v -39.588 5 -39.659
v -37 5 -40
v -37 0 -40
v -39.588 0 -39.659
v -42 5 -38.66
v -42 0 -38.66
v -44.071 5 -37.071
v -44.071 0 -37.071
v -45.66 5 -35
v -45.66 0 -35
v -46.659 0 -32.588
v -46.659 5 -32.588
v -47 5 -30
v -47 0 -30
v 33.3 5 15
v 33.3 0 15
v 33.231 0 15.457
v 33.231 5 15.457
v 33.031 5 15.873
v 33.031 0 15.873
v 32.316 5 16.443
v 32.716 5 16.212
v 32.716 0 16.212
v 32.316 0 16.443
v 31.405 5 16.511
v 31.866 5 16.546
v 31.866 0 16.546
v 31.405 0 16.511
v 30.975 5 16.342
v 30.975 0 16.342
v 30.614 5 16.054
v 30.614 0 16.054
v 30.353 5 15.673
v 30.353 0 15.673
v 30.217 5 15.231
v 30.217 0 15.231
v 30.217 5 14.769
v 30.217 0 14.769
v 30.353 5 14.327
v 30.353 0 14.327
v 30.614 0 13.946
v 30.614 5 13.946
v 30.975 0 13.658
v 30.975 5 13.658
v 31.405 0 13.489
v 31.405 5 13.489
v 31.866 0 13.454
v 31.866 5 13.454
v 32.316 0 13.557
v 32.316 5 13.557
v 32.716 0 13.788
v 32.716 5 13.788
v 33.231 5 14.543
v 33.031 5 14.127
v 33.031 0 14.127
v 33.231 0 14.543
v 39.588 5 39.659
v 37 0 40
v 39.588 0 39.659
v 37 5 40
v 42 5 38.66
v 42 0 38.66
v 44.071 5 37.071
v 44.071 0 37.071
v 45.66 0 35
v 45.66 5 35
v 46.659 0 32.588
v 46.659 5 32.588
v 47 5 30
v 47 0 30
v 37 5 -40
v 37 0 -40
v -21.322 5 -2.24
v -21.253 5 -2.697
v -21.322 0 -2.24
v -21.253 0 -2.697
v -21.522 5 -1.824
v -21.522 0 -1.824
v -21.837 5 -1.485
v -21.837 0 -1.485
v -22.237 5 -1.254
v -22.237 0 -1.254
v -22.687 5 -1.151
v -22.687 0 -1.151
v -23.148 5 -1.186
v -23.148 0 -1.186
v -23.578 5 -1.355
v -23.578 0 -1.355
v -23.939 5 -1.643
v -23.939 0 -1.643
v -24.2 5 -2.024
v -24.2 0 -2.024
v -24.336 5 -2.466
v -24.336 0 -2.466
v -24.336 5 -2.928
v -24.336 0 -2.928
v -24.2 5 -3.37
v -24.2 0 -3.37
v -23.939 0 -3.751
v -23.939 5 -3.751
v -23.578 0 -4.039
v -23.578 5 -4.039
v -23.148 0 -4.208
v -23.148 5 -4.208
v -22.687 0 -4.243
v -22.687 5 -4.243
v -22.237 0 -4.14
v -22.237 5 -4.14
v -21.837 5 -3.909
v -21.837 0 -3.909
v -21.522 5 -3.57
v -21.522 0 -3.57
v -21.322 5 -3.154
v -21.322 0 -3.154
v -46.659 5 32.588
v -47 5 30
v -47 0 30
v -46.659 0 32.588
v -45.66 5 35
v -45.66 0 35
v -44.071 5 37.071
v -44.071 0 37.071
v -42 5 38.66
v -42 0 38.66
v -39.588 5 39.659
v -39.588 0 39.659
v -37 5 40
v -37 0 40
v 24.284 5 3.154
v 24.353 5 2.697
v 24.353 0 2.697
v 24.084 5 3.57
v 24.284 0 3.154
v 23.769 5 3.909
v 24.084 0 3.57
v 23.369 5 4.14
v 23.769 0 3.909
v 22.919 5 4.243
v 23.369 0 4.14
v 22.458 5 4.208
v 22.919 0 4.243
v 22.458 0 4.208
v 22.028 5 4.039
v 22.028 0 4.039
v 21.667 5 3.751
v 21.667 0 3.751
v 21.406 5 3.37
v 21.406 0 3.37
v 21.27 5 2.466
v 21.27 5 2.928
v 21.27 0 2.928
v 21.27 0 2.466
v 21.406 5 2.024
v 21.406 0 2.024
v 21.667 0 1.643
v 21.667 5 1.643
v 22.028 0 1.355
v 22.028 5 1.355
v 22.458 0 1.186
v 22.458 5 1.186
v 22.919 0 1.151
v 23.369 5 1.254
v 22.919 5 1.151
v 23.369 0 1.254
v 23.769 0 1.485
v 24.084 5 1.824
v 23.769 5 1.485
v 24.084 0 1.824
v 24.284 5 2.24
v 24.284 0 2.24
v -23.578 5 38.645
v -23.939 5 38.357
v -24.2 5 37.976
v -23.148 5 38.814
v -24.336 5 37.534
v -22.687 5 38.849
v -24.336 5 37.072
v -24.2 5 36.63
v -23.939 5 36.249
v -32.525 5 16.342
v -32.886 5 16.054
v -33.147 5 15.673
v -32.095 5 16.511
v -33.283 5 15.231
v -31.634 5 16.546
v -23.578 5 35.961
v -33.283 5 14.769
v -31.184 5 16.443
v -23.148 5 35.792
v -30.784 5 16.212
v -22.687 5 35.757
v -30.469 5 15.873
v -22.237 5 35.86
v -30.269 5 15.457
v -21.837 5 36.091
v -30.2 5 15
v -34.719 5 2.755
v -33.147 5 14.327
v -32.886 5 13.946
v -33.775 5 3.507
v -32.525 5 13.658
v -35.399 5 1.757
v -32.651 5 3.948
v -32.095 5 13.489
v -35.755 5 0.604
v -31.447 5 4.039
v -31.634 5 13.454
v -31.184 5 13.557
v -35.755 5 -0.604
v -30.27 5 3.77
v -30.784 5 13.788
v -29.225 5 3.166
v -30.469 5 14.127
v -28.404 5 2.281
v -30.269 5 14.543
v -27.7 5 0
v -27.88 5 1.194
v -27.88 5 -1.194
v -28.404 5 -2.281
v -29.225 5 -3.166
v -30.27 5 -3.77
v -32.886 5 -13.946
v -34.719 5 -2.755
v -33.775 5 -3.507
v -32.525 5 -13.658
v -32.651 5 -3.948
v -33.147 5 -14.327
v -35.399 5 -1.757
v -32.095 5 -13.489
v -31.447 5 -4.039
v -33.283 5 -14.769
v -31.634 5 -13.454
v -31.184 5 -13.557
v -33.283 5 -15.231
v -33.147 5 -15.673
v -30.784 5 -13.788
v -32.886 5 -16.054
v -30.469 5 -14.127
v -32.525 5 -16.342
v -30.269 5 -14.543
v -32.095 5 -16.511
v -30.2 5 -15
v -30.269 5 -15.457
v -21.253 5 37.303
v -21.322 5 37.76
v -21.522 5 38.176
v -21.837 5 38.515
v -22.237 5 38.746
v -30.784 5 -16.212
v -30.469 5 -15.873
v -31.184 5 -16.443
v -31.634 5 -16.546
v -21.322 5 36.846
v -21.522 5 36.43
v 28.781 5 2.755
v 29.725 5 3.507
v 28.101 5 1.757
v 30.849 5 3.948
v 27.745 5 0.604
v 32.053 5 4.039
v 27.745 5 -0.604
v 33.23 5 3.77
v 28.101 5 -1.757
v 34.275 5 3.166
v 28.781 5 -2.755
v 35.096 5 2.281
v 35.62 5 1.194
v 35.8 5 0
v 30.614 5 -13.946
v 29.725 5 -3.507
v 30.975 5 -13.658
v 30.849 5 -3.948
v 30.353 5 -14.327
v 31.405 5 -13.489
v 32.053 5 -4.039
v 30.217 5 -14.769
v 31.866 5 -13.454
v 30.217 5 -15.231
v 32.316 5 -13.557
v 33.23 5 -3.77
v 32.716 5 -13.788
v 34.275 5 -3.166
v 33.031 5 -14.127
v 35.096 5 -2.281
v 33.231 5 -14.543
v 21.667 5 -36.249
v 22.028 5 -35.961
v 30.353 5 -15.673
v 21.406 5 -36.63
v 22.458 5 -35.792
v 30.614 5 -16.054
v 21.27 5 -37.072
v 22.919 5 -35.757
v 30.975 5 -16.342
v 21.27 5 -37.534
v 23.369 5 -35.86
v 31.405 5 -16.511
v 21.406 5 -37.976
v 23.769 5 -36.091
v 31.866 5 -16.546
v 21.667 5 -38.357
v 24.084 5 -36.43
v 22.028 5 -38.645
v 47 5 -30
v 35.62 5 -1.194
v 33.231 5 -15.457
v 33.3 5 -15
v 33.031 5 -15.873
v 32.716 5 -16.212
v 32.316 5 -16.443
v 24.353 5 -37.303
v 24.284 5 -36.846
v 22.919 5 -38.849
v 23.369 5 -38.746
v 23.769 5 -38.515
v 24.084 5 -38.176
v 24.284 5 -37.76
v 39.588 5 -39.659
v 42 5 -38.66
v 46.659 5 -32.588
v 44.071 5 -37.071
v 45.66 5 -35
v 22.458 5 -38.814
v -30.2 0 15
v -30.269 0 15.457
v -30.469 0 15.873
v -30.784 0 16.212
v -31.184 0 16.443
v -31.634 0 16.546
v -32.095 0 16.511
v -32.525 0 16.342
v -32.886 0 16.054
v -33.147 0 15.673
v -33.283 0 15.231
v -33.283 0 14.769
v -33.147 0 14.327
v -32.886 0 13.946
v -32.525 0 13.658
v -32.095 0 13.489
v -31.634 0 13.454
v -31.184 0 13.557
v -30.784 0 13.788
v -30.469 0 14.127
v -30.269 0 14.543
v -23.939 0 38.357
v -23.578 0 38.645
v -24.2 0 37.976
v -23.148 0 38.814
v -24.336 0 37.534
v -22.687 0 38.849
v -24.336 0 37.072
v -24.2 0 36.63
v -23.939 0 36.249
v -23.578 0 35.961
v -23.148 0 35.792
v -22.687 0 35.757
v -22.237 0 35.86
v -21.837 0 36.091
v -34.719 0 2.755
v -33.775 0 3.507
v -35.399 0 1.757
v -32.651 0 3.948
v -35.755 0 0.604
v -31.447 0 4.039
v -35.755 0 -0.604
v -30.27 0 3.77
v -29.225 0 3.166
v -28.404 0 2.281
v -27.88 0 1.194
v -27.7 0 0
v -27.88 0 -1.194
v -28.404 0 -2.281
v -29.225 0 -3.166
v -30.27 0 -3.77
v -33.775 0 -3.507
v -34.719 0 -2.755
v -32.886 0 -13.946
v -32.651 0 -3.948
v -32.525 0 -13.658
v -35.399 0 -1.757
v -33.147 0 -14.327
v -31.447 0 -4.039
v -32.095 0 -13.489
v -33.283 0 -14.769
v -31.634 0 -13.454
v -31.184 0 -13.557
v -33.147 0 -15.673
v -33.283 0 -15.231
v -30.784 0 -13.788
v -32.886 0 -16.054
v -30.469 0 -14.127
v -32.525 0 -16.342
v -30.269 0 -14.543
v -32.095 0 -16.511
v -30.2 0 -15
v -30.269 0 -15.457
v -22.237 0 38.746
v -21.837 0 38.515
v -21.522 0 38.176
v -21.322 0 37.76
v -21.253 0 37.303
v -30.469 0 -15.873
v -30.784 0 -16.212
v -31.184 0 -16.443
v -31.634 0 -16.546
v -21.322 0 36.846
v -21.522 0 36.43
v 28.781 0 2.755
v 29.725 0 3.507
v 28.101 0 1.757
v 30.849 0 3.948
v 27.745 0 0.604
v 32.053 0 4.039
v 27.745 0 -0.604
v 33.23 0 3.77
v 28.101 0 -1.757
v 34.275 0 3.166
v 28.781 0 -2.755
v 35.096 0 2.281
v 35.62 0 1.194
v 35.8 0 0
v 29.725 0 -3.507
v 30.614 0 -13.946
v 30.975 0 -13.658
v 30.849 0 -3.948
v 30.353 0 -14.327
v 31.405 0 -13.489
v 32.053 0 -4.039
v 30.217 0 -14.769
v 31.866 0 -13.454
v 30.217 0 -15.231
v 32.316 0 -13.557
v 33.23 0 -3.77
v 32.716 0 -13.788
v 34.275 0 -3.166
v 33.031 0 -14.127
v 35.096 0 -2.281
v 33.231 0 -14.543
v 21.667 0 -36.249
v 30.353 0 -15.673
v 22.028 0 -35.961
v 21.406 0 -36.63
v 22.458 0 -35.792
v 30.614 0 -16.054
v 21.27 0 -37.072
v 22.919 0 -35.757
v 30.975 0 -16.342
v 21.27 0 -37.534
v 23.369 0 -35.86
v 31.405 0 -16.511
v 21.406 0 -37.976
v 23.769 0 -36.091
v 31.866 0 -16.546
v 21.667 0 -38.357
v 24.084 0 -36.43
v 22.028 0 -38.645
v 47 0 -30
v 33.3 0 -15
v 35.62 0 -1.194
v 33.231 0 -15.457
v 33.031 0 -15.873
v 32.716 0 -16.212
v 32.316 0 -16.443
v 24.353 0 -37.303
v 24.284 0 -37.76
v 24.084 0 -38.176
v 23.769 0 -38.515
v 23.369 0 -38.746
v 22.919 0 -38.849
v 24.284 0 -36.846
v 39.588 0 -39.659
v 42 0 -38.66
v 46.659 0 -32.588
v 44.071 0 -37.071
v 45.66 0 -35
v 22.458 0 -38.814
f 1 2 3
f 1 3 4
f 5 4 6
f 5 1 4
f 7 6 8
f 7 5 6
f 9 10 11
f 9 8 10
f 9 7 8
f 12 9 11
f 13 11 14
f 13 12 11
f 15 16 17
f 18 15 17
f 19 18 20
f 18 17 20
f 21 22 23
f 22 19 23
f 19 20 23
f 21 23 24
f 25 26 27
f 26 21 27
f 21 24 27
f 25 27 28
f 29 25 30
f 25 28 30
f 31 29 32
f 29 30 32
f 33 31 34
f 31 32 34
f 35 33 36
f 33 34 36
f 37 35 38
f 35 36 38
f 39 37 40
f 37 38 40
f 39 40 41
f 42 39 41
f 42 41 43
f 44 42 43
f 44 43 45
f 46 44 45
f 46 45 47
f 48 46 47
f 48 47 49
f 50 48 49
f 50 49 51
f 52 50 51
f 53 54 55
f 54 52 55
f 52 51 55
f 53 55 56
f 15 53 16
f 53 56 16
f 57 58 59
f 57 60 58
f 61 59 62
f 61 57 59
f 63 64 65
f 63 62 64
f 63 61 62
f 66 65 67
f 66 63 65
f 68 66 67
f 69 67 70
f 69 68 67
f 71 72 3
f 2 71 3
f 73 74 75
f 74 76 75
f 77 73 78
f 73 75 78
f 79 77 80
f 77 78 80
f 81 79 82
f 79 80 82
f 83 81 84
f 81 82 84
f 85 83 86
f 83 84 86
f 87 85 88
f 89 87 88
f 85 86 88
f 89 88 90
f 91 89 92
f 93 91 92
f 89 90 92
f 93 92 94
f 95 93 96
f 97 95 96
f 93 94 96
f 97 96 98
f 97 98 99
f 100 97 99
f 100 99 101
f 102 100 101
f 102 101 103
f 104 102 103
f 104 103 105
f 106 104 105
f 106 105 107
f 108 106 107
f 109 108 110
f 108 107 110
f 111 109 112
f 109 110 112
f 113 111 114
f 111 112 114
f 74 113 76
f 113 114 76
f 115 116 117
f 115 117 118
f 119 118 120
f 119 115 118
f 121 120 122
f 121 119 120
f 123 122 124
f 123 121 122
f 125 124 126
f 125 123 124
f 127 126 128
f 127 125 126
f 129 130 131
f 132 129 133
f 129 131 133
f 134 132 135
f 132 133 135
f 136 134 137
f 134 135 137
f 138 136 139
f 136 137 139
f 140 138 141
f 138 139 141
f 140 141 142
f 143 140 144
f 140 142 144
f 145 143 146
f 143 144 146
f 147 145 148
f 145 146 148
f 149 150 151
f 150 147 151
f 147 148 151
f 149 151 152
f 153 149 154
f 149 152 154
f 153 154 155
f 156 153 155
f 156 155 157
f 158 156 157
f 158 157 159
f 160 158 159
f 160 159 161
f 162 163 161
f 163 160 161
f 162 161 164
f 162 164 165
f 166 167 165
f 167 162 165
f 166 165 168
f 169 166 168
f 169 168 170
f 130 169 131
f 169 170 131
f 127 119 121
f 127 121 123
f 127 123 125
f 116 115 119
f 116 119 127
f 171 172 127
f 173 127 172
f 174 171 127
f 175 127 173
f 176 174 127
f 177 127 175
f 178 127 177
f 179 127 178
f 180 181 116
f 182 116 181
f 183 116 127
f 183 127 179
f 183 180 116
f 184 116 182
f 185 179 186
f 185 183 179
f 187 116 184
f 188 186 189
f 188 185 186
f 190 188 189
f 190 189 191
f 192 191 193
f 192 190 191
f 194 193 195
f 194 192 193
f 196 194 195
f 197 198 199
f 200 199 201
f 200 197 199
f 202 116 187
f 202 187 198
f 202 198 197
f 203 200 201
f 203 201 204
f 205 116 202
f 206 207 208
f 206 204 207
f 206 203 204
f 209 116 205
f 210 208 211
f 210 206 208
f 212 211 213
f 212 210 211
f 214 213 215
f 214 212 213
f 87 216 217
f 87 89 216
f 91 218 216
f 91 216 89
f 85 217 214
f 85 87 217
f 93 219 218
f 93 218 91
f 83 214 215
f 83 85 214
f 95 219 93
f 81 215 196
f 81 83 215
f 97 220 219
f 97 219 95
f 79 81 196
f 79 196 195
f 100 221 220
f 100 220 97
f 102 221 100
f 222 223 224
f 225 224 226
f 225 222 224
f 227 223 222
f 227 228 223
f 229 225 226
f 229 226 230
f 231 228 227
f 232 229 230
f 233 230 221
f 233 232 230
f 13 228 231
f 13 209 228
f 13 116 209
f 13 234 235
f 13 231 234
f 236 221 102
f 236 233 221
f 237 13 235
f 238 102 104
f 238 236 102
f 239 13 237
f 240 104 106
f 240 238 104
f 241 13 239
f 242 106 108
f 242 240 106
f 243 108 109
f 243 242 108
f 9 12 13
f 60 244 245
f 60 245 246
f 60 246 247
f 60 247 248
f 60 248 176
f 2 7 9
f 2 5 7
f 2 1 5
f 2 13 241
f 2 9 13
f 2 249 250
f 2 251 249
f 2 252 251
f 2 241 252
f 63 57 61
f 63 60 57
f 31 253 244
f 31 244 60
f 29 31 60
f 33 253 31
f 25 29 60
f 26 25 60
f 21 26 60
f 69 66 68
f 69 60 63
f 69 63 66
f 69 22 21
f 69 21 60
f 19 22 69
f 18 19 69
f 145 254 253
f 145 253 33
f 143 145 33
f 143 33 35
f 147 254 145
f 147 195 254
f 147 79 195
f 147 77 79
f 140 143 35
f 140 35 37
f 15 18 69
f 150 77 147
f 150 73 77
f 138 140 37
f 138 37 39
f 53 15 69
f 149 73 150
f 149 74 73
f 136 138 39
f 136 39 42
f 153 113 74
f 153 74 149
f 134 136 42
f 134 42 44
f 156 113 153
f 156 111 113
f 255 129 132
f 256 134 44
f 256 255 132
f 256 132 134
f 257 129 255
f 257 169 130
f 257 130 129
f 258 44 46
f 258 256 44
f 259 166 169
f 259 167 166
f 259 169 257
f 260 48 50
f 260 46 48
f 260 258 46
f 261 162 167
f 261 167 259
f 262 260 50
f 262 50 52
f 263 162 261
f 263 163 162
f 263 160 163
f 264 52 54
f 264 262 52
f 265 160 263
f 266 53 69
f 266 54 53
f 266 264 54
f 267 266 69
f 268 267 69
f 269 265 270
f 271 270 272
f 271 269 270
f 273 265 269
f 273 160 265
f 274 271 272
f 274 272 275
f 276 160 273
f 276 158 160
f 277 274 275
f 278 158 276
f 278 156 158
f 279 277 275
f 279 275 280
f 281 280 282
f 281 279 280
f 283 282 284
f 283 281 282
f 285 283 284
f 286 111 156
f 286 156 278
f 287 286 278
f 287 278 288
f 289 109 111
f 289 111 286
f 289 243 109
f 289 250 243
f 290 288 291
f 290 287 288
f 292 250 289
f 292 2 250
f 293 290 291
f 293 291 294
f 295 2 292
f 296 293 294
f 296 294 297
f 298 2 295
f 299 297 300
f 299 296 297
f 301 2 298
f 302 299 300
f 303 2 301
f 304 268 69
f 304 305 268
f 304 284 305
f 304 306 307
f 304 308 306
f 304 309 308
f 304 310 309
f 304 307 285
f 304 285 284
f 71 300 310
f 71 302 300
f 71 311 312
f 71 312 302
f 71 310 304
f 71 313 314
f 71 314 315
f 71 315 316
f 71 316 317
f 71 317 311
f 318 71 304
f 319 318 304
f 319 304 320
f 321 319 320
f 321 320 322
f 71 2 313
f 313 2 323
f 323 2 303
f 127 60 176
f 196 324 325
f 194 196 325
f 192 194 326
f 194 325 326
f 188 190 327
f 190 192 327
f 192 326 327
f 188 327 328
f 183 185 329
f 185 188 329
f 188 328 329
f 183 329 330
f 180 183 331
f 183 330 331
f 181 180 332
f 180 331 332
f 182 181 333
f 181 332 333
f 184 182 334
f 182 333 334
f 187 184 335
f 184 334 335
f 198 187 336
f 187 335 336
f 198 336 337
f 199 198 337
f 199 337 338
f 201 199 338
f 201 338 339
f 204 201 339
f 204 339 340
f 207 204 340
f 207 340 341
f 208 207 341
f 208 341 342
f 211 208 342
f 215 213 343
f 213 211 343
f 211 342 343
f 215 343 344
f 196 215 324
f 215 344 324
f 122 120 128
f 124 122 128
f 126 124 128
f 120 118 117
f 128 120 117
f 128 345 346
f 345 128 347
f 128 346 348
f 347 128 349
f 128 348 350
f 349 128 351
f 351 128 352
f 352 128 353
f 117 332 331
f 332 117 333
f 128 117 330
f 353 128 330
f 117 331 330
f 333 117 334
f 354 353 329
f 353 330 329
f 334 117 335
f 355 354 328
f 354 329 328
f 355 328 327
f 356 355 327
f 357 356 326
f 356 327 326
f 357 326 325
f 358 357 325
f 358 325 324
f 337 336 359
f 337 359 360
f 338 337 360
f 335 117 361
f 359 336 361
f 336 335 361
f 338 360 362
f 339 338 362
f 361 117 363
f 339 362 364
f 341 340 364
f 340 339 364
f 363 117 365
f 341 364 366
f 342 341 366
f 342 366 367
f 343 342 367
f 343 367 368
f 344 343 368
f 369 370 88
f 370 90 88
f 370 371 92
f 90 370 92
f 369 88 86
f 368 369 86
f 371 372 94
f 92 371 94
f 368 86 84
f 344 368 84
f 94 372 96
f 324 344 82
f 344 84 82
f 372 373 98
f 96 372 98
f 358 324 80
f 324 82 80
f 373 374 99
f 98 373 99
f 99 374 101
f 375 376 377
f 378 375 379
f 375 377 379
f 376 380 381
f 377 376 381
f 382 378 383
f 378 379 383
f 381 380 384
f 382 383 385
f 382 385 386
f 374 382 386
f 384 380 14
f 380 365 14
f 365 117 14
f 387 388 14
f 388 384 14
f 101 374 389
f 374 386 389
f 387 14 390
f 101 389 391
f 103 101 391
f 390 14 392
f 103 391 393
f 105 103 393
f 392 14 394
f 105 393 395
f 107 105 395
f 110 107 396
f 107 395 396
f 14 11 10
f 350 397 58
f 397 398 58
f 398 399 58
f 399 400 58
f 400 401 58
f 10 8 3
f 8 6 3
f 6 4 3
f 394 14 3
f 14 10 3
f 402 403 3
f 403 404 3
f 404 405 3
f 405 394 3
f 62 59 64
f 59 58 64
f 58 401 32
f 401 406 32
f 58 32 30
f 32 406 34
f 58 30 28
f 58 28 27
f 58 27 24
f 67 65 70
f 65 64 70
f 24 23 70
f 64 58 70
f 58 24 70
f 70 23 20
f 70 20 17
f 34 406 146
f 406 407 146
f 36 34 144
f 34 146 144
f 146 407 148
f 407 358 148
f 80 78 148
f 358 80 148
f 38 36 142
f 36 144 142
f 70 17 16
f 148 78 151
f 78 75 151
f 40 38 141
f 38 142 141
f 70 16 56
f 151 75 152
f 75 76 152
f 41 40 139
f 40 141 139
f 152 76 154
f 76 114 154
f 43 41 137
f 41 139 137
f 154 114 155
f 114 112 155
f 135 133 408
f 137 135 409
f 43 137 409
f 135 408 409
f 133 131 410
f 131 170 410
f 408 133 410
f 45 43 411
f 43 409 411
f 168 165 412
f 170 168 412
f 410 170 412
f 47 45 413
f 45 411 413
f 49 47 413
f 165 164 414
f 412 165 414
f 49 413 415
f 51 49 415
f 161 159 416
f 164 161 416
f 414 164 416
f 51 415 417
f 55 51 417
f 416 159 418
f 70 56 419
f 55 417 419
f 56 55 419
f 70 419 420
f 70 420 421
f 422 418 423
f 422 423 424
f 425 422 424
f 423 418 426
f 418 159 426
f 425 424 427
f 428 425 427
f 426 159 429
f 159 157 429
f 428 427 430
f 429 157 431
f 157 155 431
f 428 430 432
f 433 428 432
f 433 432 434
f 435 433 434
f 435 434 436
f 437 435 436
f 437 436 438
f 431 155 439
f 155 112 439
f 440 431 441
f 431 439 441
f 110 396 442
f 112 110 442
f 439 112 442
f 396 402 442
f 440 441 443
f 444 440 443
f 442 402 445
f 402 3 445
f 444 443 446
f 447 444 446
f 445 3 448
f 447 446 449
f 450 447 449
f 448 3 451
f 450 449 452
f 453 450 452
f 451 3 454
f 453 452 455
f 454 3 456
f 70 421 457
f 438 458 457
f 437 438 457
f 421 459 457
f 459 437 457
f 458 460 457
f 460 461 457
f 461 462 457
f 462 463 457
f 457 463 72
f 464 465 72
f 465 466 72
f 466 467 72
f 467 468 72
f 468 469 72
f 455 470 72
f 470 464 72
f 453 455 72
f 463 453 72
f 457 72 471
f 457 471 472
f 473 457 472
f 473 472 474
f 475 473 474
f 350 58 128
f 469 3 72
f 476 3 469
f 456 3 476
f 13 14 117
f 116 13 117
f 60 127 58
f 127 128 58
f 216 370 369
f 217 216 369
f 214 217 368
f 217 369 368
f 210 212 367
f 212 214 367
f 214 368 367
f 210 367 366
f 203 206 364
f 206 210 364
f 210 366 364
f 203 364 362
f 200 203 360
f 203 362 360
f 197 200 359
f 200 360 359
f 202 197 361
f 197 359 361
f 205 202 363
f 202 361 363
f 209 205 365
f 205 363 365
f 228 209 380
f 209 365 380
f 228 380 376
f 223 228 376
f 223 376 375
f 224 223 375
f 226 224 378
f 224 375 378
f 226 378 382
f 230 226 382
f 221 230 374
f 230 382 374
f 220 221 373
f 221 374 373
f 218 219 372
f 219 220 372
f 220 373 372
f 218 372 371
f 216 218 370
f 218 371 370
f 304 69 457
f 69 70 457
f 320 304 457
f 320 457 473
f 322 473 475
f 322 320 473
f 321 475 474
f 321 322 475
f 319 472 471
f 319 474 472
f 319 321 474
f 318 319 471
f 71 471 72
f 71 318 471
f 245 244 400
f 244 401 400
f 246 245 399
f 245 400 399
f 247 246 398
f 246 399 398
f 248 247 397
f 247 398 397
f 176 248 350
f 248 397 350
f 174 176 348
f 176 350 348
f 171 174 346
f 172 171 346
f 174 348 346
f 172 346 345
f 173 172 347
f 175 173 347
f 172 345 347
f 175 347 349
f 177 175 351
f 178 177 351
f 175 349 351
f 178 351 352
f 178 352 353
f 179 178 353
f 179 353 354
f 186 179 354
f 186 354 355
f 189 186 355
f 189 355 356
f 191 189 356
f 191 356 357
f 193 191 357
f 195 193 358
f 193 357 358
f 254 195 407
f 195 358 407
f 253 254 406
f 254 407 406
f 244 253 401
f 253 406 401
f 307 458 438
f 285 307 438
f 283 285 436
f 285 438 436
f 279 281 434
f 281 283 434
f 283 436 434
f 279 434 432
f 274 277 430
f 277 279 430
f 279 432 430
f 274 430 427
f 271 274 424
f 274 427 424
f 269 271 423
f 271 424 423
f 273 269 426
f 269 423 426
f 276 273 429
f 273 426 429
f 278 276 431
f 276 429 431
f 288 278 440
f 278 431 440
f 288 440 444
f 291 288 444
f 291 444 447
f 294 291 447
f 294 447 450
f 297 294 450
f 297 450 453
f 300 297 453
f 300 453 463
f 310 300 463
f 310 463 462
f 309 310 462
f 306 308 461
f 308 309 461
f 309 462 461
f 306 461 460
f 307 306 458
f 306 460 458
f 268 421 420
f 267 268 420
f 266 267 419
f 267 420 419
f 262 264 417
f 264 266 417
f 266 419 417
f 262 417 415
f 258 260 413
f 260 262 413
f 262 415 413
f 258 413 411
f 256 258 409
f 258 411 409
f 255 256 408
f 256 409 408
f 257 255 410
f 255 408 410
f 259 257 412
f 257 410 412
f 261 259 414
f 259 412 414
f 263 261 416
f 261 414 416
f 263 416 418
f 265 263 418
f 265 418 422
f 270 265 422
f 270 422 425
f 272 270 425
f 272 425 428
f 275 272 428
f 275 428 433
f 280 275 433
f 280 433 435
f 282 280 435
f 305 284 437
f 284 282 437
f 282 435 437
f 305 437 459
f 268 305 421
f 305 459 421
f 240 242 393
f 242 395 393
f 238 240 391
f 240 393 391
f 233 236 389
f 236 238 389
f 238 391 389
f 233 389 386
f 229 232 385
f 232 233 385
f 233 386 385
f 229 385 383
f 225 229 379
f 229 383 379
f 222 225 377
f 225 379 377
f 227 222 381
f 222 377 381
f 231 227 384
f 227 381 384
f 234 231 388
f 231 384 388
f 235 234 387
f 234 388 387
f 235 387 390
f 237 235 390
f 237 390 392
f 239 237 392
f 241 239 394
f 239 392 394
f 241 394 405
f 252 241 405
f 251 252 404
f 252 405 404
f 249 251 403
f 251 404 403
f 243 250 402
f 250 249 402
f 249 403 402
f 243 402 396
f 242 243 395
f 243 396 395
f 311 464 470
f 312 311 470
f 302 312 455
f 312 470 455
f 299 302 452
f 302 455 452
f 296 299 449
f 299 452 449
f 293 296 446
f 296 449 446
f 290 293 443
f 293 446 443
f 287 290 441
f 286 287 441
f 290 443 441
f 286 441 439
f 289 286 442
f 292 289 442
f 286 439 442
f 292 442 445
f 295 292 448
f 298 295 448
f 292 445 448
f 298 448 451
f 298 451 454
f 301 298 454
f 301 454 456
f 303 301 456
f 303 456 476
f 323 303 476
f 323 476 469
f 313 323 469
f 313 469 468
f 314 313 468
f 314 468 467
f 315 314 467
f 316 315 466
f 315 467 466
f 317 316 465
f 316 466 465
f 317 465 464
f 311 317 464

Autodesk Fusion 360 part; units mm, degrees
sketch "Sketch1" plane through (0, 0, 0) normal (0, 1, 0) x (1, 0, 0)
  line L0 (-20.75, -20) -> (20.75, -20) construction
  line L1 (20.75, -20) -> (20.75, 20) construction
  line L2 (20.75, 20) -> (-20.75, 20) construction
  line L3 (-20.75, 20) -> (-20.75, -20) construction
  line L4 (-20.75, -20) -> (20.75, 20) construction
  line L5 (20.75, -20) -> (-20.75, 20) construction
  circle A0 centre (-31.75, 0) radius 4.05
  circle A1 centre (31.75, 0) radius 4.05
  line L6 (25.5, 0) -> (-25.5, 0)
  line L7 (22.803, -2.697) -> (-22.803, -2.697)
  line L8 (-22.803, -2.697) -> (-22.803, -37.303)
  line L9 (-22.803, -37.303) -> (22.803, -37.303)
  line L10 (22.803, -37.303) -> (22.803, -2.697)
  line L11 (22.803, -2.697) -> (-22.803, -37.303) construction
  line L12 (-22.803, -2.697) -> (22.803, -37.303) construction
  line L13 (22.803, 2.697) -> (-22.803, 2.697)
  line L14 (-22.803, 2.697) -> (-22.803, 37.303)
  line L15 (-22.803, 37.303) -> (22.803, 37.303)
  line L16 (22.803, 37.303) -> (22.803, 2.697)
  line L17 (22.803, 2.697) -> (-22.803, 37.303) construction
  line L18 (-22.803, 2.697) -> (22.803, 37.303) construction
  circle A2 centre (-22.803, -37.303) radius 1.55
  circle A3 centre (22.803, -2.697) radius 1.55
  circle A4 centre (-22.803, 2.697) radius 1.55
  circle A5 centre (22.803, 37.303) radius 1.55
  circle A6 centre (-31.75, -15) radius 1.55
  circle A7 centre (-31.75, 15) radius 1.55
  circle A8 centre (31.75, -15) radius 1.55
  circle A9 centre (31.75, 15) radius 1.55
  line L19 (-47, -40) -> (47, -40)
  line L20 (47, -40) -> (47, 40)
  line L21 (47, 40) -> (-47, 40)
  line L22 (-47, 40) -> (-47, -40)
  line L23 (-47, -40) -> (47, 40) construction
  line L24 (47, -40) -> (-47, 40) construction
  point P0 (0, -20)
  point P1 (0, 20)
  point P2 (0, -20)
  point P3 (0, 20)
  dimension "d1" = 41.5
  dimension "d2" = 40
  dimension "d3" = 8.1
  dimension "d4" = 8.1
  dimension "d5" = 11
  dimension "d6" = 11
  dimension "d7" = 51
  dimension "d8" = 20
  dimension "d9" = 20
  dimension "d10" = 45.606
  dimension "d11" = 34.606
  dimension "d12" = 45.606
  dimension "d13" = 34.606
  dimension "d14" = 3.1
  dimension "d15" = 3.1
  dimension "d16" = 3.1
  dimension "d17" = 3.1
  dimension "d18" = 3.1
  dimension "d19" = 3.1
  dimension "d20" = 3.1
  dimension "d21" = 3.1
  dimension "d22" = 15
  dimension "d23" = 15
  dimension "d24" = 15
  dimension "d25" = 15
  dimension "d26" = 94
  dimension "d27" = 80
extrude "Extrude1" add sketch "Sketch1" along normal blind 5 contours L7 L8 L9 L10 A2 A3 | L13 L14 L15 L16 A4 A5 | L19 L20 L21 L22
fillet "Fillet1" radius 10 4 edges at (47, 2.5, 40) (47, 2.5, -40) (-47, 2.5, 40) (-47, 2.5, -40)
equation "d6 = d5"
equation "d23 = d22"
equation "d24 = d23"
equation "d25 = d22"
